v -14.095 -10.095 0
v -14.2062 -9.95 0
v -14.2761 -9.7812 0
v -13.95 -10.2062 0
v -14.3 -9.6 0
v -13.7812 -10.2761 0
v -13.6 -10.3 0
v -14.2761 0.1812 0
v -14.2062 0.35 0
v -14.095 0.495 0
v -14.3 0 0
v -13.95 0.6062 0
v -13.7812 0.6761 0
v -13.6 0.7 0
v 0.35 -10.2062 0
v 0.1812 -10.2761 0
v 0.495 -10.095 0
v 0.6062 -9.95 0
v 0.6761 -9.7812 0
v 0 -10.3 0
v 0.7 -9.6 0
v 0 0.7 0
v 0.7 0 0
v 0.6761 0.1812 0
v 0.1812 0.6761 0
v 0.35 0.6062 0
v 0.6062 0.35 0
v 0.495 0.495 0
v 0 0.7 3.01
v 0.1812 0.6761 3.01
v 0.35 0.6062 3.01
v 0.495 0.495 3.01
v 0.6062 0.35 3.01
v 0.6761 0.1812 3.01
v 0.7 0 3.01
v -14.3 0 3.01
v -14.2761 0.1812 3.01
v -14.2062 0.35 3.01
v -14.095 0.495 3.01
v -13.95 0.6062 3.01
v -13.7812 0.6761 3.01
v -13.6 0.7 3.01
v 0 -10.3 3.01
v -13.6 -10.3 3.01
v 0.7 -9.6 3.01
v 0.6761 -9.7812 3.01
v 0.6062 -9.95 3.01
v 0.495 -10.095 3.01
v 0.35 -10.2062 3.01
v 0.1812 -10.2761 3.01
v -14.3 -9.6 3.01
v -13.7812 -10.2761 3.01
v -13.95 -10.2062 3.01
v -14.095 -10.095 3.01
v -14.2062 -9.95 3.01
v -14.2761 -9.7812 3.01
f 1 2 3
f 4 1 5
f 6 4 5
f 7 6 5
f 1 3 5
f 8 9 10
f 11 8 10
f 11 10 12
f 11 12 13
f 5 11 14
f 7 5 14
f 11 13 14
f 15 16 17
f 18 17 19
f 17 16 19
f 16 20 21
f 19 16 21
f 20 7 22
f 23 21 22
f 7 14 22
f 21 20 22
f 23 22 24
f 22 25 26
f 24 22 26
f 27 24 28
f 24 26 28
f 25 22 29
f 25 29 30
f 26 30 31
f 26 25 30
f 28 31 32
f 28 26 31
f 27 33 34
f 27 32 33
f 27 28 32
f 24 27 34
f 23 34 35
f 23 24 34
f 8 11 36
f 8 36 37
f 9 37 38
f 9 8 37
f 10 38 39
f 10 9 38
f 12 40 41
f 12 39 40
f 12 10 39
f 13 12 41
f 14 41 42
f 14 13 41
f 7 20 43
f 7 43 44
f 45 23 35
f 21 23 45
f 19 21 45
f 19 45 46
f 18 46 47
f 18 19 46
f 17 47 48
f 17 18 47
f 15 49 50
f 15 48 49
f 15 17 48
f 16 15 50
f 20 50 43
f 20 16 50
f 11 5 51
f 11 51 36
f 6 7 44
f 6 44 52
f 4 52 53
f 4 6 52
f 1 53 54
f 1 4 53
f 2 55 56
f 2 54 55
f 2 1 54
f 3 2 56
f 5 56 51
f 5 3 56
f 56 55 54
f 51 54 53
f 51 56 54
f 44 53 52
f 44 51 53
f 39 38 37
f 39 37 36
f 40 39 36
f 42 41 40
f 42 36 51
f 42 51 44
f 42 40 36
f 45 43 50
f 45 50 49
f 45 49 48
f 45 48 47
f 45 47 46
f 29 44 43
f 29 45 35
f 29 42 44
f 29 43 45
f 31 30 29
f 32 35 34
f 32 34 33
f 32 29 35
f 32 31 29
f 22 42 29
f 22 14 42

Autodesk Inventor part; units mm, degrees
ref_plane "YZ Plane" through (0, 0, 0) normal (1, 0, 0) x (0, 1, 0)
ref_plane "XZ Plane" through (0, 0, 0) normal (0, 1, 0) x (-1, 0, 0)
ref_plane "XY Plane" through (0, 0, 0) normal (0, 0, 1) x (1, 0, 0)
ref_plane "Work Plane1" through (0, 0, 0) normal (0, 0, 1) x (1, 0, 0)
sketch "Sketch1" plane through (0, 0, 0) normal (0, 0, 1) x (1, 0, 0)
  line L0 (-13.1, -2.25) -> (-13.1, -7.35) projected
  arc A0 (-13.6, 0.7) -> (-14.3, 0) centre (-13.6, 0) ccw projected
  line L1 (-13.6, 0.7) -> (0, 0.7) projected
  arc A1 (0.7, 0) -> (0, 0.7) centre (0, 0) ccw projected
  line L2 (0.7, 0) -> (0.7, -9.6) projected
  arc A2 (0, -10.3) -> (0.7, -9.6) centre (0, -9.6) ccw projected
  line L3 (0, -10.3) -> (-13.6, -10.3) projected
  arc A3 (-14.3, -9.6) -> (-13.6, -10.3) centre (-13.6, -9.6) ccw projected
  line L4 (-14.3, -9.6) -> (-14.3, 0) projected
  line L5 (-2.25, -9.1) -> (-11.35, -9.1) projected
  arc A4 (-2.25, -9.1) -> (-0.5, -7.35) centre (-2.25, -7.35) ccw projected
  line L6 (-0.5, -2.25) -> (-0.5, -7.35) projected
  arc A5 (-0.5, -2.25) -> (-2.25, -0.5) centre (-2.25, -2.25) ccw projected
  line L7 (-11.35, -0.5) -> (-2.25, -0.5) projected
  arc A6 (-11.35, -0.5) -> (-13.1, -2.25) centre (-11.35, -2.25) ccw projected
  line L8 (-13.1, -7.35) -> (-13.1, -2.25) projected
  arc A7 (-13.1, -7.35) -> (-11.35, -9.1) centre (-11.35, -7.35) ccw projected
  point P0 (0, 0)
extrude "Extrusion1" add sketch "Sketch1" along normal blind 3.01 contours A6 L7 A5 L6 A4 L5 A7 L0 | L1 A1 L2 A2 L3 A3 L4 A0
properties part number "LS2_LEDs_patch"
